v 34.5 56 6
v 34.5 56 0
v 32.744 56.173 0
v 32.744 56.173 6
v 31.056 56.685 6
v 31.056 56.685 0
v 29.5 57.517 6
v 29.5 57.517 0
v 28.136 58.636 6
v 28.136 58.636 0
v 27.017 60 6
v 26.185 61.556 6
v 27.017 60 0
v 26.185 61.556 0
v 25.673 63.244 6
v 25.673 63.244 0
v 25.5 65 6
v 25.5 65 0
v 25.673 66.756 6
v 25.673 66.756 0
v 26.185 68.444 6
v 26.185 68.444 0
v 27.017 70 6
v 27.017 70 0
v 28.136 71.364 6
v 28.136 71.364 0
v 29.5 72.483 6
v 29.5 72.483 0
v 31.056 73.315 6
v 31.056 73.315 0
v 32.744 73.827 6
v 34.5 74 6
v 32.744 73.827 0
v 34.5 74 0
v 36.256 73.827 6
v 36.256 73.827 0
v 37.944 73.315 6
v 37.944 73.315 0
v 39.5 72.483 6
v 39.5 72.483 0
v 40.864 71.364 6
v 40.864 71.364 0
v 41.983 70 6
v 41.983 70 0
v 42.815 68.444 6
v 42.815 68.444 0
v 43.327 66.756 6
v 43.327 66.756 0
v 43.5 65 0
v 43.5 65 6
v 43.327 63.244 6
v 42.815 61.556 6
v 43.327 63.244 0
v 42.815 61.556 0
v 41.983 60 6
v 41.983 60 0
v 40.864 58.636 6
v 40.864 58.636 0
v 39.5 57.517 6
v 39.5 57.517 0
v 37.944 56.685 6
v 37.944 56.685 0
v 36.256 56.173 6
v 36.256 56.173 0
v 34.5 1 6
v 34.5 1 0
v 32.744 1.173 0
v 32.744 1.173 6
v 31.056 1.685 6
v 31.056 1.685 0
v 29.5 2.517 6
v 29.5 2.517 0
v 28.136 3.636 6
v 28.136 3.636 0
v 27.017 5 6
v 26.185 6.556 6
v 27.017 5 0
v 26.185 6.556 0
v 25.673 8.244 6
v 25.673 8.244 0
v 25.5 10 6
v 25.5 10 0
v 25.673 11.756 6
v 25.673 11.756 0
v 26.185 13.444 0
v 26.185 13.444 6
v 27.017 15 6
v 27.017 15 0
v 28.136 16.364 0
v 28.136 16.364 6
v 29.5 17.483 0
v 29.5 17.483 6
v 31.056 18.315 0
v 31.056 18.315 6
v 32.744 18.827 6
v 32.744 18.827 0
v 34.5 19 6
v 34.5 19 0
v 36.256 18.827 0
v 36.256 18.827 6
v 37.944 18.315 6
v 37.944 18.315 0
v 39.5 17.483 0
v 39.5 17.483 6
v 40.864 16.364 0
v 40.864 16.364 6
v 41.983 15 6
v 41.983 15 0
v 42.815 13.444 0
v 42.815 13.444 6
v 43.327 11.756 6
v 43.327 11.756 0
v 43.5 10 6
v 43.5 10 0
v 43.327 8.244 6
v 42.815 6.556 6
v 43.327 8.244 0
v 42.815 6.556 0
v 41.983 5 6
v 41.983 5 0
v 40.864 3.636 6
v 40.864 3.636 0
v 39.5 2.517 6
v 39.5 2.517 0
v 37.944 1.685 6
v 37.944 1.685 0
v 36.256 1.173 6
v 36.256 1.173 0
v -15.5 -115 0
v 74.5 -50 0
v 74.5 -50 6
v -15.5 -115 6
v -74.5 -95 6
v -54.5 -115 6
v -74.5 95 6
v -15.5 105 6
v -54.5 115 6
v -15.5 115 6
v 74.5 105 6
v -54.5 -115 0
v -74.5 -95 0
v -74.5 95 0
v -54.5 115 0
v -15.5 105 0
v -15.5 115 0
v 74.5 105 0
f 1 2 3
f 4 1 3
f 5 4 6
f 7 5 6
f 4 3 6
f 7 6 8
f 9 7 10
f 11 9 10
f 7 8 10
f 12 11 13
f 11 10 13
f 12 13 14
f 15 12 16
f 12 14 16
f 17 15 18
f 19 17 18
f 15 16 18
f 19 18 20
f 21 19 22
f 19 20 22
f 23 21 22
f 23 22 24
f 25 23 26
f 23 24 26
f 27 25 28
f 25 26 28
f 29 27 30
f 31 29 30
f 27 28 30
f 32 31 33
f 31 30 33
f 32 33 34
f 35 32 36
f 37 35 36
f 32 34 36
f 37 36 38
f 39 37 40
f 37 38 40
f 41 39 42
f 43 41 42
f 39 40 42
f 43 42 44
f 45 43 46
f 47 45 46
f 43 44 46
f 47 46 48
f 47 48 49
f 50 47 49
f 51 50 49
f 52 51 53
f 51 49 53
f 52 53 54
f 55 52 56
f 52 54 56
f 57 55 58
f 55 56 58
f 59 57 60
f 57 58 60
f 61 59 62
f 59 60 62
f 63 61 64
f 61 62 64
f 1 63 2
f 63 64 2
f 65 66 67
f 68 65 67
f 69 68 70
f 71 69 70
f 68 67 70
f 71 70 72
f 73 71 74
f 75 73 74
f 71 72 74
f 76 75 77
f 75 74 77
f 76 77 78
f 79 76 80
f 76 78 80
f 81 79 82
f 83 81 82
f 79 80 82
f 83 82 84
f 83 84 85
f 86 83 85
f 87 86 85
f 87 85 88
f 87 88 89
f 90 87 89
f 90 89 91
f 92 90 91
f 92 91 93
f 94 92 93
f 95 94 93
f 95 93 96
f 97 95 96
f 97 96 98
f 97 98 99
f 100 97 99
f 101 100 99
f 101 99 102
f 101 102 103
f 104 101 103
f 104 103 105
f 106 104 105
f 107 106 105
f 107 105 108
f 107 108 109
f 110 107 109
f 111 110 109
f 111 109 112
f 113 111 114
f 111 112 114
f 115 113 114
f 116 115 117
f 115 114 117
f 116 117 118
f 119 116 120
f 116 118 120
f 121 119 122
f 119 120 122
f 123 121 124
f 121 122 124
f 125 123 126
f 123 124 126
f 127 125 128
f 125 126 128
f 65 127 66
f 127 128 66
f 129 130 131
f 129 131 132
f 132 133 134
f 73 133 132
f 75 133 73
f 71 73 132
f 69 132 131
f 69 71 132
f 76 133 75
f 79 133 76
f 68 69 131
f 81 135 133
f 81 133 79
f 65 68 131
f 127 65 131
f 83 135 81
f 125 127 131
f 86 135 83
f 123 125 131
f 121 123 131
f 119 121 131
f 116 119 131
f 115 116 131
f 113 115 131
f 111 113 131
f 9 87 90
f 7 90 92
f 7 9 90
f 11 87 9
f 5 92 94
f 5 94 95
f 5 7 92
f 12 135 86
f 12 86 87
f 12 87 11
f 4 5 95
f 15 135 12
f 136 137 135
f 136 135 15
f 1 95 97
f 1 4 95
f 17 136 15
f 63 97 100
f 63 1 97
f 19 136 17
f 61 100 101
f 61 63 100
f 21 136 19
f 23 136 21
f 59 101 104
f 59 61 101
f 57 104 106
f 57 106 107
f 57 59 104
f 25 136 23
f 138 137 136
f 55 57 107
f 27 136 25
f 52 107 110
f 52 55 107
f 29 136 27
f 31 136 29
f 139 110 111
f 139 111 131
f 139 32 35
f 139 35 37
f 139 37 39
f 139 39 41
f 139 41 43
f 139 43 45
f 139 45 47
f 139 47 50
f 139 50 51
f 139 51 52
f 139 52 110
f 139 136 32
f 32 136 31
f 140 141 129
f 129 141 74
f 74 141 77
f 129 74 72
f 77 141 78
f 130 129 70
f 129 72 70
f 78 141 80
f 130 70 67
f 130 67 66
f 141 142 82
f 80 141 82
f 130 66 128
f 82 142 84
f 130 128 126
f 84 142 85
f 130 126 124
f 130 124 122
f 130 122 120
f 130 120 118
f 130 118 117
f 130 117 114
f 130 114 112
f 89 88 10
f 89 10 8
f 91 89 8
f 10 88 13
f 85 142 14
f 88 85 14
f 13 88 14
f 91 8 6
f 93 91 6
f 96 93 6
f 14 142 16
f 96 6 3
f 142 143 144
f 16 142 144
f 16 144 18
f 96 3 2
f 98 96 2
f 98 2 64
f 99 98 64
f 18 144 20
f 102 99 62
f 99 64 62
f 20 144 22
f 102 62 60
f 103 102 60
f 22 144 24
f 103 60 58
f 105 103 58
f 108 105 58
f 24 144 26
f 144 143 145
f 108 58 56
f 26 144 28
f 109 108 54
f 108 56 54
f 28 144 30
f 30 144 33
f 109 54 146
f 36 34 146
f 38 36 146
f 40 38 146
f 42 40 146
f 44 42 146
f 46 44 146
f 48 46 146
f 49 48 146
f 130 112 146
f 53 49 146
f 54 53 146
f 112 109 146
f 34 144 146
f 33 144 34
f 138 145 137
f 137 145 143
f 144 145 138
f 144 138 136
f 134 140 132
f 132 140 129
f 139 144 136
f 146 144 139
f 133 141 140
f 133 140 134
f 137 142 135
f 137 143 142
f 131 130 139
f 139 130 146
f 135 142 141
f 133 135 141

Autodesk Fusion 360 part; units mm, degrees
sketch "スケッチ1" plane through (0, 0, 0) normal (0, 0, 1) x (1, 0, 0)
  line L0 (-15.5, 115) -> (-74.5, 115)
  line L1 (-74.5, 115) -> (-74.5, -115)
  line L2 (-74.5, -115) -> (-15.5, -115)
  line L3 (74.5, -50) -> (74.5, 105)
  line L4 (68.0217, 105) -> (-74.5, -115) construction
  line L5 (-74.5, 115) -> (45.8131, -70.7183) construction
  line L6 (-15.5, 115) -> (-15.5, 105)
  line L7 (-15.5, 105) -> (74.5, 105)
  line L8 (-74.5, -115) -> (-15.5, -115) construction
  line L9 (74.5, -50) -> (-15.5, -115)
  dimension "d2" = 230
  dimension "d5" = 59
extrude "押し出し1" add sketch "スケッチ1" along normal blind 6
chamfer "面取り1" distance 20 angle 45 2 edges at (-74.5, -115, 3) (-74.5, 115, 3)
sketch "スケッチ2" plane through (0, 0, 6) normal (0, 0, 1) x (-1, 0, 0)
  line L0 (54.5, -115) -> (74.5, -95)
  line L1 (74.5, -95) -> (74.5, 95)
  line L2 (74.5, 95) -> (54.5, 115)
  line L3 (54.5, 115) -> (15.5, 115)
  line L4 (15.5, 115) -> (-74.5, 50)
  line L5 (-74.5, 50) -> (-74.5, -105)
  line L6 (-74.5, -105) -> (15.5, -105)
  line L7 (15.5, -105) -> (15.5, -115)
  line L8 (15.5, -115) -> (54.5, -115)
  line L9 (-74.5, -105) -> (-34.5, -105) construction
  line L10 (-34.5, -105) -> (-34.5, -65) construction
  line L11 (-34.5, -65) -> (-74.5, -65) construction
  line L12 (-74.5, -65) -> (-74.5, -105) construction
  line L13 (-34.5, -65) -> (-34.5, -10) construction
  point P0 (-34.5, -65)
  point P1 (-34.5, -10)
  dimension "d10" = 40
  dimension "d11" = 40
  dimension "d12" = 55
hole "穴1" at (34.5, 65, 6) at (34.5, 10, 6) direction (0, 0, -1) diameter 18 end through all
equation "d5 = 20 mm + 39 mm"
